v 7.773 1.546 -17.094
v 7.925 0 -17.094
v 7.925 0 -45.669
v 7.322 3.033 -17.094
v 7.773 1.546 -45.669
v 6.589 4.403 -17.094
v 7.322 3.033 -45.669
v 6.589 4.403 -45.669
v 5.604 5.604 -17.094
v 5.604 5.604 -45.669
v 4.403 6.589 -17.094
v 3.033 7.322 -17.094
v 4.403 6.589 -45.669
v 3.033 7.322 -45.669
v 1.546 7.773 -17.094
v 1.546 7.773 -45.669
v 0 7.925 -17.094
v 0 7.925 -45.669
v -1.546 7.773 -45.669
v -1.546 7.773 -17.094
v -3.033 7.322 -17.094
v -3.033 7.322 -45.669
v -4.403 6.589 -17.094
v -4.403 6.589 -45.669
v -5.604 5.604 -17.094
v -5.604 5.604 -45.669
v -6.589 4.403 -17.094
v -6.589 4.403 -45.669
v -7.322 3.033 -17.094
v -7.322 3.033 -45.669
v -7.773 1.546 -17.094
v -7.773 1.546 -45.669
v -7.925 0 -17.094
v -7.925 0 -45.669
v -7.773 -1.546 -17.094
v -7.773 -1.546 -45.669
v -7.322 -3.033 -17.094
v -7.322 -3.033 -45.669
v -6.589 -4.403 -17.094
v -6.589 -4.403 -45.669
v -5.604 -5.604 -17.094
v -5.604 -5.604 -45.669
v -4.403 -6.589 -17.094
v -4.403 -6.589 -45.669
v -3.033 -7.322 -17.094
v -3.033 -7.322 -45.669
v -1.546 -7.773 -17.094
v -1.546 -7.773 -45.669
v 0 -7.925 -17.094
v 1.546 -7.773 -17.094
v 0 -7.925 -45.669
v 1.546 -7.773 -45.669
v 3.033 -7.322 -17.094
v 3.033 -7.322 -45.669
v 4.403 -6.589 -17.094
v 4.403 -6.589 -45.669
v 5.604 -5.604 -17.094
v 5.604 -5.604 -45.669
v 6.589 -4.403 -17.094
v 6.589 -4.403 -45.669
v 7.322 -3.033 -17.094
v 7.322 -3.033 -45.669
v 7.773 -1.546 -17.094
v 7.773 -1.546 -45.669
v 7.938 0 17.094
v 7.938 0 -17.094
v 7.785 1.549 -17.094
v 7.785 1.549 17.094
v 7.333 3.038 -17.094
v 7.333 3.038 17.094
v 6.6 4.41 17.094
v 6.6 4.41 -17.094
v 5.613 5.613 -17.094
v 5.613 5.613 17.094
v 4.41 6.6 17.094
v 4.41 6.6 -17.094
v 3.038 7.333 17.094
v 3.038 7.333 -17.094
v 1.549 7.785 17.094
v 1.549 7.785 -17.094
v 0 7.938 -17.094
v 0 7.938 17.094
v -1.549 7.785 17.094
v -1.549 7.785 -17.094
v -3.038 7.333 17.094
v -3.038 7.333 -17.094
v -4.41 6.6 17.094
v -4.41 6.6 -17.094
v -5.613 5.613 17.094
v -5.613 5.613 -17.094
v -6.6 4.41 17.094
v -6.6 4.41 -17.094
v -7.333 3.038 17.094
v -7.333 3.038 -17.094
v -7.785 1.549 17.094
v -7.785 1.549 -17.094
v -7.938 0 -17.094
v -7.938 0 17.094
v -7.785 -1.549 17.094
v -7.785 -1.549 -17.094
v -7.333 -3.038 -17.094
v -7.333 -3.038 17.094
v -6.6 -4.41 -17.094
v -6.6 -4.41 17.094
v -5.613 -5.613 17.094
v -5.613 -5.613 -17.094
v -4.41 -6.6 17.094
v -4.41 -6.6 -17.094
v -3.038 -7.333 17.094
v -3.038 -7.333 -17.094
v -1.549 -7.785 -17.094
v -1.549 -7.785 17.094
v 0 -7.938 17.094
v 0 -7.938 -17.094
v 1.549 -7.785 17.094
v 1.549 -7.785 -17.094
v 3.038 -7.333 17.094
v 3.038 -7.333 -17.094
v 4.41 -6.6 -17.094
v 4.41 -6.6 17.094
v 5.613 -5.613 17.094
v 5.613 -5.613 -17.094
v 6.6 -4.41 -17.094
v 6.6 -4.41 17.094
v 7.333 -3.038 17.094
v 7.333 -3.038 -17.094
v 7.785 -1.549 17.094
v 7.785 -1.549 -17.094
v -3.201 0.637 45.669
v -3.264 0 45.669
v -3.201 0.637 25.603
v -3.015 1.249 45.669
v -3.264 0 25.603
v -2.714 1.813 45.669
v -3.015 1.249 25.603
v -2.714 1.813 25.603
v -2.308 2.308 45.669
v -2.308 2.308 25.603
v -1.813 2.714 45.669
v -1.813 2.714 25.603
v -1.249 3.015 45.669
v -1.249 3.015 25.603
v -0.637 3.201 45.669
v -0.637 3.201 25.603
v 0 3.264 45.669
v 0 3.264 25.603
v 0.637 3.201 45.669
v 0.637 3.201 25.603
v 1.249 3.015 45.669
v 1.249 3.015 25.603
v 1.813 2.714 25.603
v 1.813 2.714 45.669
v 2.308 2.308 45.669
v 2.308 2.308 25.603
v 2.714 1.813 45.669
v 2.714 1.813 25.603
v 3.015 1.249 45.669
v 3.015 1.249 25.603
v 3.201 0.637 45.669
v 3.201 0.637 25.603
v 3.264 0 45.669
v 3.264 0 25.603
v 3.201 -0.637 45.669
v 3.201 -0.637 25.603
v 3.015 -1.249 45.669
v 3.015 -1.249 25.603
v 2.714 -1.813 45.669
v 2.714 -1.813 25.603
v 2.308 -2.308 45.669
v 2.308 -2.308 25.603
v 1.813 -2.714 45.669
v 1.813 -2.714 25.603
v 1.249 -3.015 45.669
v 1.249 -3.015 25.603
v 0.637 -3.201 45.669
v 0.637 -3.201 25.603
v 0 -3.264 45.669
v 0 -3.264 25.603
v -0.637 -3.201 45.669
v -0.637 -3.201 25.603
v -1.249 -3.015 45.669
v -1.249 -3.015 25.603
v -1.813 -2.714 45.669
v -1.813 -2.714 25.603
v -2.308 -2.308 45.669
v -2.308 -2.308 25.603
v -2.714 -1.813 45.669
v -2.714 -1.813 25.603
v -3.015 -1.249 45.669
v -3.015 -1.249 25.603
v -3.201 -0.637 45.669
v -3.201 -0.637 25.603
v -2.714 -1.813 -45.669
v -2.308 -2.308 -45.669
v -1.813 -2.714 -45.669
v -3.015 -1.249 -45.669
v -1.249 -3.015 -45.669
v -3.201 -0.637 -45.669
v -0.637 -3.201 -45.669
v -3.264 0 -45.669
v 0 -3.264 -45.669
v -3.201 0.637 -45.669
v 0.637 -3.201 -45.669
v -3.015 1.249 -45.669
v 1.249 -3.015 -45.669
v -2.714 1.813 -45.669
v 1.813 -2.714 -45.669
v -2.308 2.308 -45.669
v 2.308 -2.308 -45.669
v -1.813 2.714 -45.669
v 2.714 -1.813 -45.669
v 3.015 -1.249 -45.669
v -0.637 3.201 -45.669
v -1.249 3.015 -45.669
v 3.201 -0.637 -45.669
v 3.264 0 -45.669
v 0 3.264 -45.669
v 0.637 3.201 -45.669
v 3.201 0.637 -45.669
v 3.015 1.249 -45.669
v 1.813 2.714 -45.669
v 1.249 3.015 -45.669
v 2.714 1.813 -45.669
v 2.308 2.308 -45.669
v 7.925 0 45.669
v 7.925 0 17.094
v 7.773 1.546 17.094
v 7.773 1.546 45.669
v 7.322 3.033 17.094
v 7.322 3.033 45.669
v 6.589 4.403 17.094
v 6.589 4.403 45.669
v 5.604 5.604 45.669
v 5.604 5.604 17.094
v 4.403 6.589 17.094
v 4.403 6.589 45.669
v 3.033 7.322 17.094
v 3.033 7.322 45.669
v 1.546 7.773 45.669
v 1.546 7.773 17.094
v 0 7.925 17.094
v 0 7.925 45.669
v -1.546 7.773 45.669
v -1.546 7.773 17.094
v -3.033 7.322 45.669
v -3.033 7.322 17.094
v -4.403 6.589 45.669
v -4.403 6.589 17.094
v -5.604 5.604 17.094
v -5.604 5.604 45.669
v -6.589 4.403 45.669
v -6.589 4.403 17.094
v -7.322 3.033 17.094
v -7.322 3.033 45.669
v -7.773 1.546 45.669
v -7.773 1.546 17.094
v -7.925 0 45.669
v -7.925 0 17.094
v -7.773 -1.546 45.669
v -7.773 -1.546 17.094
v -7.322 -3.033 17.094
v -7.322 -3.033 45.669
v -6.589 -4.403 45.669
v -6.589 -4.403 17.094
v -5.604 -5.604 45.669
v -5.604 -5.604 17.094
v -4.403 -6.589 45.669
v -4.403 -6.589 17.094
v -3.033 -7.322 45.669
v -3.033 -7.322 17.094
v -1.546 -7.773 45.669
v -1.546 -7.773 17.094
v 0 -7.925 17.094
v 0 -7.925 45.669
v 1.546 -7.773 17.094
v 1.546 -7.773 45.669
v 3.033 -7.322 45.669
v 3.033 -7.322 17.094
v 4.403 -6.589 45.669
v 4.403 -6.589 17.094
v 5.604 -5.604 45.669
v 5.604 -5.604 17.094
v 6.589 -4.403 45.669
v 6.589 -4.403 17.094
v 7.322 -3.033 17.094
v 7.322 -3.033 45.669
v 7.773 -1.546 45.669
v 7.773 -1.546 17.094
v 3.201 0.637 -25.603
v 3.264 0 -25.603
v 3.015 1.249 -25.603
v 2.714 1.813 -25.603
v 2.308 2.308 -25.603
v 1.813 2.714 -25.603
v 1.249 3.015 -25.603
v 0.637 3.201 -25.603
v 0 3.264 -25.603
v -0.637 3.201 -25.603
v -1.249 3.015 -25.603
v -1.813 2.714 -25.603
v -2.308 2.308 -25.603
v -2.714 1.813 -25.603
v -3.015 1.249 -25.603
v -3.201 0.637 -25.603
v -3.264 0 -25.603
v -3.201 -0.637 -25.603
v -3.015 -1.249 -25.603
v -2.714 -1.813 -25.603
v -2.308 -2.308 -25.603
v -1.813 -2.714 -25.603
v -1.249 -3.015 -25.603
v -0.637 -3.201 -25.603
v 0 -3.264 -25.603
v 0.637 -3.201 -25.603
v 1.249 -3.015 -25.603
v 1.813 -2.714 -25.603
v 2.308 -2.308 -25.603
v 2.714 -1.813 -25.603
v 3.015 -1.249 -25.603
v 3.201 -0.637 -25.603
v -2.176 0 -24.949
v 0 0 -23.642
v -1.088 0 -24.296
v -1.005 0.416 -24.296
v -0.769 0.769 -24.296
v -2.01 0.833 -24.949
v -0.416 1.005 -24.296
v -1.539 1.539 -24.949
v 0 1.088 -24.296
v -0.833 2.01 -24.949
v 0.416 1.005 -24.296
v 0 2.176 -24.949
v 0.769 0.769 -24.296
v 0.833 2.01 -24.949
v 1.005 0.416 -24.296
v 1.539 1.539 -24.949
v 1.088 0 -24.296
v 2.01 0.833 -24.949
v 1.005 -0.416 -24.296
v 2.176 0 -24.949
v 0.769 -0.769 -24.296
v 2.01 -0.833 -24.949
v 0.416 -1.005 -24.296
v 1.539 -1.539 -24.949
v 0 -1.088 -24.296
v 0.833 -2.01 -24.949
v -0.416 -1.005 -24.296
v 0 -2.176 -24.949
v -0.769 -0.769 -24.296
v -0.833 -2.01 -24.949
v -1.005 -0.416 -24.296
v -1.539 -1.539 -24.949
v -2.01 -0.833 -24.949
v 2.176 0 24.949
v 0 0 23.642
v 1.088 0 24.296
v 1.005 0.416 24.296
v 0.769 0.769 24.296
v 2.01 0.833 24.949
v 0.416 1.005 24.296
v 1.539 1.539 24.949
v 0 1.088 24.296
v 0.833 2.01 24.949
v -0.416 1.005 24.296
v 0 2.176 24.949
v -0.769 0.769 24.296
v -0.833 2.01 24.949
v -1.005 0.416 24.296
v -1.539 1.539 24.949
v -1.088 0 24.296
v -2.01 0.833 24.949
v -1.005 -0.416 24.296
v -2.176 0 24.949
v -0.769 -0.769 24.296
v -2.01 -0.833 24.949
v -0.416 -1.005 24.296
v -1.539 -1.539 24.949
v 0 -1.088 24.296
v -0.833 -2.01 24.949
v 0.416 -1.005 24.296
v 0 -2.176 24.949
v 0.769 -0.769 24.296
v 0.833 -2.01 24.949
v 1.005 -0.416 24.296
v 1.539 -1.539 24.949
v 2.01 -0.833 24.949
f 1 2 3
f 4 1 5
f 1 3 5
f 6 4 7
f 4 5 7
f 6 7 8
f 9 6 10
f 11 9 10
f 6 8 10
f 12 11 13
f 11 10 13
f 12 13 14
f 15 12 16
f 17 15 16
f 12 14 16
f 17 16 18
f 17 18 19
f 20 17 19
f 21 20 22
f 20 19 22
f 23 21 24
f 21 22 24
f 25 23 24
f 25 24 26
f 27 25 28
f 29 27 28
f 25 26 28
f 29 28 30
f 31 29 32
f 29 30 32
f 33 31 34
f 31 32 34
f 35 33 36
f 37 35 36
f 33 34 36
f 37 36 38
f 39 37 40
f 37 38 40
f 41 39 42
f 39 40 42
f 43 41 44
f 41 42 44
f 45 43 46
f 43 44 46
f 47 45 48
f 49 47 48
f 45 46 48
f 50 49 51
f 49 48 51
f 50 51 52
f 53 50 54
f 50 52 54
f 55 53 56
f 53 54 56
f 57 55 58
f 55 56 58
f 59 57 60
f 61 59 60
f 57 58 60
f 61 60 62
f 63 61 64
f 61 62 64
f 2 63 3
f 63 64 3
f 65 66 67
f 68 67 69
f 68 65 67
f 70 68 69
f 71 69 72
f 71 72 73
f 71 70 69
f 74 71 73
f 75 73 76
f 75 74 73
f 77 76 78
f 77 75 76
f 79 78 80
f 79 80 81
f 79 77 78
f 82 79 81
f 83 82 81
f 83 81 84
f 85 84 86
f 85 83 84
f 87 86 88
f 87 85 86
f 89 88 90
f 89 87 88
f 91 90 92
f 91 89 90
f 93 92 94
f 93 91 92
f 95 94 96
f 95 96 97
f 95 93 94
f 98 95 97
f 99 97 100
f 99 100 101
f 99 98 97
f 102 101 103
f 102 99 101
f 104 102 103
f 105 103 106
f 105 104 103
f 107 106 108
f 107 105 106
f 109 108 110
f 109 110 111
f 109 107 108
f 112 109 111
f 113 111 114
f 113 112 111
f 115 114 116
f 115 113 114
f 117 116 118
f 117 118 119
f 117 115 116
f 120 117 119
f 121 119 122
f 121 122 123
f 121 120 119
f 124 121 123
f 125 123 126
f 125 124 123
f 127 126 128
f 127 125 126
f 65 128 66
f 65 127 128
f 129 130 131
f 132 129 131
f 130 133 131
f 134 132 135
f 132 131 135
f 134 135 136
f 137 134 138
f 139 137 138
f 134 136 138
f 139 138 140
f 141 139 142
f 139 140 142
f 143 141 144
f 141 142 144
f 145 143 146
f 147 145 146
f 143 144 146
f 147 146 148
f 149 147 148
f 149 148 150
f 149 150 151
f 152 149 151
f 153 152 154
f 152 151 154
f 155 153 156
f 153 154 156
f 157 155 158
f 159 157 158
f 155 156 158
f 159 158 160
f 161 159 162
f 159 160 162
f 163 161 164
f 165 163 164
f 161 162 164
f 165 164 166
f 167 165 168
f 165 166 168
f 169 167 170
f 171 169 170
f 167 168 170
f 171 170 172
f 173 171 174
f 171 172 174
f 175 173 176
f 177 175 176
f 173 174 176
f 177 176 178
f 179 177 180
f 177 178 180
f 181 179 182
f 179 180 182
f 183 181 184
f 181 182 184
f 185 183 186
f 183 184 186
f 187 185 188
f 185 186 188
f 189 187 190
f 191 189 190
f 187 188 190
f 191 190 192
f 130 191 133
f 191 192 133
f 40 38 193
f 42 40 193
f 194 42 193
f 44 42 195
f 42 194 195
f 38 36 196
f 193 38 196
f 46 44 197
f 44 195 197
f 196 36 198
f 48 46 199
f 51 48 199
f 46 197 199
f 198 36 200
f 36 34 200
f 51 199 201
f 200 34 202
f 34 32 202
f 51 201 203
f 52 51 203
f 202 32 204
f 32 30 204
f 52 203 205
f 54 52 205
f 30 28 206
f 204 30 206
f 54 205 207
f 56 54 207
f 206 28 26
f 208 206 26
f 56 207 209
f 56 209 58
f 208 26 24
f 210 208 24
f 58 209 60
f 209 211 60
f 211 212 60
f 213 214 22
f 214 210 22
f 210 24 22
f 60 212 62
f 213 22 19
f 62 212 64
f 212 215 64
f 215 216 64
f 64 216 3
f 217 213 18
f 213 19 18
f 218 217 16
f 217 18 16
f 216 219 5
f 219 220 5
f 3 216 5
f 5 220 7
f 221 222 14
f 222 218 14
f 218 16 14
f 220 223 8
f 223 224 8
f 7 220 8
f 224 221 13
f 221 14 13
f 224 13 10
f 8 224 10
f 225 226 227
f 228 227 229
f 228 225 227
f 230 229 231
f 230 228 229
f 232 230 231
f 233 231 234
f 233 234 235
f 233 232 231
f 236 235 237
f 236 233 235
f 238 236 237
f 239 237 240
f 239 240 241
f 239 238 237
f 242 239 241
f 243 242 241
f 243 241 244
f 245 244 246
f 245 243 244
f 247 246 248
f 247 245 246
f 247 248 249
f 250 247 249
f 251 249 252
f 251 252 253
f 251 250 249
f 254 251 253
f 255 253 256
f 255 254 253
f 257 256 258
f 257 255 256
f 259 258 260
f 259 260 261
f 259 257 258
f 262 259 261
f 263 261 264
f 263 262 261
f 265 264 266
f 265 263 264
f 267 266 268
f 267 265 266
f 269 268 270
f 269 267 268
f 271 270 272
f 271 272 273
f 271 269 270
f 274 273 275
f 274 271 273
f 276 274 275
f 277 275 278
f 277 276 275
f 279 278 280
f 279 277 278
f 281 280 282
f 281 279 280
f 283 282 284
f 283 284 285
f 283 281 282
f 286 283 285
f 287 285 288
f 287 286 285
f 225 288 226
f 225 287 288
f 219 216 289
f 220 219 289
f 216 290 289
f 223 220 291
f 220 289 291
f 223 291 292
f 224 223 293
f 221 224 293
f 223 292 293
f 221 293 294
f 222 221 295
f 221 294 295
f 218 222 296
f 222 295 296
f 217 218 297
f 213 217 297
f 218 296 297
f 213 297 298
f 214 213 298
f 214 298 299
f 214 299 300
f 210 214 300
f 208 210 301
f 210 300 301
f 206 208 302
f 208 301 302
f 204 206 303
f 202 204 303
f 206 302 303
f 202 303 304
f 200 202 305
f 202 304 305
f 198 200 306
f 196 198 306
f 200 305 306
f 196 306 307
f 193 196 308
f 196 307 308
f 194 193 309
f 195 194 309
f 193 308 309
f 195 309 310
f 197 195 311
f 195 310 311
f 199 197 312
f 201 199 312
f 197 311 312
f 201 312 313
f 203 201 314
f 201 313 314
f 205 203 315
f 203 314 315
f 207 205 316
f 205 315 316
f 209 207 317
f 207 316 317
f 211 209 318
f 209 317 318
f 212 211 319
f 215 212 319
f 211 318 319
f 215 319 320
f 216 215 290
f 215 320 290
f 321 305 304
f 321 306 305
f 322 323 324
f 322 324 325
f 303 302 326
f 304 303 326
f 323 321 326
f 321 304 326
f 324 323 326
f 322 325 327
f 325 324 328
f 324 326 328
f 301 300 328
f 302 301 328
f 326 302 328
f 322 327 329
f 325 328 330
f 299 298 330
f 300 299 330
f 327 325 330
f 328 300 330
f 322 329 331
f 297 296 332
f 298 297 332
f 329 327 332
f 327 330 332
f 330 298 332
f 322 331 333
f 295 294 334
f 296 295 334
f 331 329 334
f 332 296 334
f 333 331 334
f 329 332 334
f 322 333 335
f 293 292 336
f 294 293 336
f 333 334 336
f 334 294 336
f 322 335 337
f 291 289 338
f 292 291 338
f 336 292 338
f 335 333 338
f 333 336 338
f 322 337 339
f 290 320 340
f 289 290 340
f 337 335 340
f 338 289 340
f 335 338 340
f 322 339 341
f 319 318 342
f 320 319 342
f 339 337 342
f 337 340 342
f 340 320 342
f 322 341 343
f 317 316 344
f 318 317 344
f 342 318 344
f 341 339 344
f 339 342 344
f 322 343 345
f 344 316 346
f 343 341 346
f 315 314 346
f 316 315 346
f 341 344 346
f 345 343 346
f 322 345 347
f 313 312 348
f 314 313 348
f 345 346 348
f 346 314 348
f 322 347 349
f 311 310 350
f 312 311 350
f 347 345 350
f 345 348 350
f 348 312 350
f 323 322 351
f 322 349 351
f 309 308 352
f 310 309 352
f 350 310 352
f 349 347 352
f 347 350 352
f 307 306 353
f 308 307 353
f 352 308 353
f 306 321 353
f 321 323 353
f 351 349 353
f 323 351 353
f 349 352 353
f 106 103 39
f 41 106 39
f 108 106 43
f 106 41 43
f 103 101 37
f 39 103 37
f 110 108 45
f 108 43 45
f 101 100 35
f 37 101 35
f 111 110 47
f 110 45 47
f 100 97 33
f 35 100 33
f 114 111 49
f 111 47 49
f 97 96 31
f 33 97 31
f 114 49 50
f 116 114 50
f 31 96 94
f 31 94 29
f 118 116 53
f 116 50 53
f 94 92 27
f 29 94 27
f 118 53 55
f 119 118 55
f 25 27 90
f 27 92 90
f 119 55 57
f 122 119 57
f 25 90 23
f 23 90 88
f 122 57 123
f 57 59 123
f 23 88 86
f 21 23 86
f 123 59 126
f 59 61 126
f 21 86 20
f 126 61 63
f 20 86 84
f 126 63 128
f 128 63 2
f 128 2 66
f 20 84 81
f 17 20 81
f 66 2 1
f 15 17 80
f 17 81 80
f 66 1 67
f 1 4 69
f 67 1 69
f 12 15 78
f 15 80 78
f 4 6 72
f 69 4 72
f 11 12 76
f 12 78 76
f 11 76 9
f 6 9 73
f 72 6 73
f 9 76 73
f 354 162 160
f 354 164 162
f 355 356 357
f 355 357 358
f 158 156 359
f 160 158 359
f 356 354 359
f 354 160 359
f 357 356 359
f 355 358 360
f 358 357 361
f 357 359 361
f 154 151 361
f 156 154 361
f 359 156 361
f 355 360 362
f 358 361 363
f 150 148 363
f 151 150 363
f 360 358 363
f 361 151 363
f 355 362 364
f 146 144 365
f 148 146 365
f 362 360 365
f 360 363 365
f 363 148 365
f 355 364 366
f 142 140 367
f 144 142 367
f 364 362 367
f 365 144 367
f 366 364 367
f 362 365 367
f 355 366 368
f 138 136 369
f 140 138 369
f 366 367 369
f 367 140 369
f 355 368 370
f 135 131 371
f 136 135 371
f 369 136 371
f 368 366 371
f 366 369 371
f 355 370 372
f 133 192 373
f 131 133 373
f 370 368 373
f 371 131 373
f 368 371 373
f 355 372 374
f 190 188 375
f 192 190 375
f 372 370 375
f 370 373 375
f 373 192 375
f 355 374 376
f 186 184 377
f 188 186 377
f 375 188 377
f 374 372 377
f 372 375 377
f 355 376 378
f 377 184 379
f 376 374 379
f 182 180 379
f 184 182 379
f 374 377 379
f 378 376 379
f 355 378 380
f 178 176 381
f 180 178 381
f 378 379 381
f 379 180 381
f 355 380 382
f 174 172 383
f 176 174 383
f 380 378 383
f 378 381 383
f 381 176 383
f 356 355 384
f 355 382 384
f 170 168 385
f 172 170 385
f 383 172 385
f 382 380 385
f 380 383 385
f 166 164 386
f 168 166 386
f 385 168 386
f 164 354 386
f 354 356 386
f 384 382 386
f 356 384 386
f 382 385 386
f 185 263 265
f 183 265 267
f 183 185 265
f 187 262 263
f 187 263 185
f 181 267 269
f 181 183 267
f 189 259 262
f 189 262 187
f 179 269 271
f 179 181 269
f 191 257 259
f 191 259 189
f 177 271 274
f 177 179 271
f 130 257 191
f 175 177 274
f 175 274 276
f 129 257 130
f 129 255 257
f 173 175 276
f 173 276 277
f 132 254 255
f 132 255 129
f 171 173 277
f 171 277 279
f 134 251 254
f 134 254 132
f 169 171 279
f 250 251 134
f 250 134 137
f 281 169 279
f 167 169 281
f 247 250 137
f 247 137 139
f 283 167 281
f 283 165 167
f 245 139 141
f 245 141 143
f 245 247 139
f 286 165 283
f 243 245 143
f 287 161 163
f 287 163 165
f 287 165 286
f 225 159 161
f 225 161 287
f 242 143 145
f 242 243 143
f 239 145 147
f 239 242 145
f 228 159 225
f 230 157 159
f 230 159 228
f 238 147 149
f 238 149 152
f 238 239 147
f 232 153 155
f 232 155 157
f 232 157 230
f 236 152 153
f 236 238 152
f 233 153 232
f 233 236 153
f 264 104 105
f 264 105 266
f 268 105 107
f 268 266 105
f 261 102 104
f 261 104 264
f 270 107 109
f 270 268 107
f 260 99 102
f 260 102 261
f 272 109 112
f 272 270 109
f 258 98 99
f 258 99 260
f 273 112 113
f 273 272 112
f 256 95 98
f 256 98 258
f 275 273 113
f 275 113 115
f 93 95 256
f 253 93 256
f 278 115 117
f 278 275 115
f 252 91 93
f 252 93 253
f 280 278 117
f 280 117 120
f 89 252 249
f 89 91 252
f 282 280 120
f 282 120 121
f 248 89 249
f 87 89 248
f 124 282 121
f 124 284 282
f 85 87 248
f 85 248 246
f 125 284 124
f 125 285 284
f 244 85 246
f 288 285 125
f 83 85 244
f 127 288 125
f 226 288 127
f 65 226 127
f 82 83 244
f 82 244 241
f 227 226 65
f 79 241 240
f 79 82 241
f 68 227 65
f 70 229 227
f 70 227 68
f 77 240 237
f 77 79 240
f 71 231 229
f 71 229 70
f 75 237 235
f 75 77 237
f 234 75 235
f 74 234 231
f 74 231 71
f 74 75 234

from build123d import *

# Parameters (mm, degrees)
SKETCH1_R                    = 7.9375
EXTRUDE1_DEPTH               = 45.6692
F_5_16_18_TAPPED_HOLE1_D     = 6.5278
F_5_16_18_TAPPED_HOLE1_DEPTH = 20.066
F_5_16_18_TAPPED_HOLE1_TIP   = 1.961148974
F_5_16_18_TAPPED_HOLE2_D     = 6.5278
F_5_16_18_TAPPED_HOLE2_DEPTH = 20.066
F_5_16_18_TAPPED_HOLE2_TIP   = 1.961148974
SKETCH6_R                    = 7.9375
SKETCH6_R_2                  = 7.9248
CUT_EXTRUDE1_DEPTH           = 28.575


with BuildPart() as part:
    # Sketch1 → Extrude1 (new body, symmetric)
    with BuildSketch(Plane.XY):
        Circle(SKETCH1_R)
    extrude(amount=EXTRUDE1_DEPTH, both=True)

    # 5/16-18 Tapped Hole1
    with Locations(Plane.XY.offset(45.6692)):
        with Locations((0, 0)):
            Hole(F_5_16_18_TAPPED_HOLE1_D / 2, depth=F_5_16_18_TAPPED_HOLE1_DEPTH)
            with Locations((0, 0, -(F_5_16_18_TAPPED_HOLE1_DEPTH + F_5_16_18_TAPPED_HOLE1_TIP / 2))):  # 118° drill point
                Cone(0, F_5_16_18_TAPPED_HOLE1_D / 2, F_5_16_18_TAPPED_HOLE1_TIP, mode=Mode.SUBTRACT)

    # 5/16-18 Tapped Hole2
    with Locations(Plane(origin=(0, 0, -45.6692), x_dir=(-1, 0, 0), z_dir=(0, 0, -1))):
        with Locations((0, 0)):
            Hole(F_5_16_18_TAPPED_HOLE2_D / 2, depth=F_5_16_18_TAPPED_HOLE2_DEPTH)
            with Locations((0, 0, -(F_5_16_18_TAPPED_HOLE2_DEPTH + F_5_16_18_TAPPED_HOLE2_TIP / 2))):  # 118° drill point
                Cone(0, F_5_16_18_TAPPED_HOLE2_D / 2, F_5_16_18_TAPPED_HOLE2_TIP, mode=Mode.SUBTRACT)

    # Sketch6 → Cut-Extrude1 (cut)
    with BuildSketch(Plane.XY.offset(45.6692)):
        Circle(SKETCH6_R)
        Circle(SKETCH6_R_2, mode=Mode.SUBTRACT)
    cut_extrude1 = extrude(amount=-CUT_EXTRUDE1_DEPTH, mode=Mode.SUBTRACT)

    # Mirror1: Cut-Extrude1 across plane
    add(cut_extrude1.mirror(Plane.XY), mode=Mode.SUBTRACT)


solid = part.part
